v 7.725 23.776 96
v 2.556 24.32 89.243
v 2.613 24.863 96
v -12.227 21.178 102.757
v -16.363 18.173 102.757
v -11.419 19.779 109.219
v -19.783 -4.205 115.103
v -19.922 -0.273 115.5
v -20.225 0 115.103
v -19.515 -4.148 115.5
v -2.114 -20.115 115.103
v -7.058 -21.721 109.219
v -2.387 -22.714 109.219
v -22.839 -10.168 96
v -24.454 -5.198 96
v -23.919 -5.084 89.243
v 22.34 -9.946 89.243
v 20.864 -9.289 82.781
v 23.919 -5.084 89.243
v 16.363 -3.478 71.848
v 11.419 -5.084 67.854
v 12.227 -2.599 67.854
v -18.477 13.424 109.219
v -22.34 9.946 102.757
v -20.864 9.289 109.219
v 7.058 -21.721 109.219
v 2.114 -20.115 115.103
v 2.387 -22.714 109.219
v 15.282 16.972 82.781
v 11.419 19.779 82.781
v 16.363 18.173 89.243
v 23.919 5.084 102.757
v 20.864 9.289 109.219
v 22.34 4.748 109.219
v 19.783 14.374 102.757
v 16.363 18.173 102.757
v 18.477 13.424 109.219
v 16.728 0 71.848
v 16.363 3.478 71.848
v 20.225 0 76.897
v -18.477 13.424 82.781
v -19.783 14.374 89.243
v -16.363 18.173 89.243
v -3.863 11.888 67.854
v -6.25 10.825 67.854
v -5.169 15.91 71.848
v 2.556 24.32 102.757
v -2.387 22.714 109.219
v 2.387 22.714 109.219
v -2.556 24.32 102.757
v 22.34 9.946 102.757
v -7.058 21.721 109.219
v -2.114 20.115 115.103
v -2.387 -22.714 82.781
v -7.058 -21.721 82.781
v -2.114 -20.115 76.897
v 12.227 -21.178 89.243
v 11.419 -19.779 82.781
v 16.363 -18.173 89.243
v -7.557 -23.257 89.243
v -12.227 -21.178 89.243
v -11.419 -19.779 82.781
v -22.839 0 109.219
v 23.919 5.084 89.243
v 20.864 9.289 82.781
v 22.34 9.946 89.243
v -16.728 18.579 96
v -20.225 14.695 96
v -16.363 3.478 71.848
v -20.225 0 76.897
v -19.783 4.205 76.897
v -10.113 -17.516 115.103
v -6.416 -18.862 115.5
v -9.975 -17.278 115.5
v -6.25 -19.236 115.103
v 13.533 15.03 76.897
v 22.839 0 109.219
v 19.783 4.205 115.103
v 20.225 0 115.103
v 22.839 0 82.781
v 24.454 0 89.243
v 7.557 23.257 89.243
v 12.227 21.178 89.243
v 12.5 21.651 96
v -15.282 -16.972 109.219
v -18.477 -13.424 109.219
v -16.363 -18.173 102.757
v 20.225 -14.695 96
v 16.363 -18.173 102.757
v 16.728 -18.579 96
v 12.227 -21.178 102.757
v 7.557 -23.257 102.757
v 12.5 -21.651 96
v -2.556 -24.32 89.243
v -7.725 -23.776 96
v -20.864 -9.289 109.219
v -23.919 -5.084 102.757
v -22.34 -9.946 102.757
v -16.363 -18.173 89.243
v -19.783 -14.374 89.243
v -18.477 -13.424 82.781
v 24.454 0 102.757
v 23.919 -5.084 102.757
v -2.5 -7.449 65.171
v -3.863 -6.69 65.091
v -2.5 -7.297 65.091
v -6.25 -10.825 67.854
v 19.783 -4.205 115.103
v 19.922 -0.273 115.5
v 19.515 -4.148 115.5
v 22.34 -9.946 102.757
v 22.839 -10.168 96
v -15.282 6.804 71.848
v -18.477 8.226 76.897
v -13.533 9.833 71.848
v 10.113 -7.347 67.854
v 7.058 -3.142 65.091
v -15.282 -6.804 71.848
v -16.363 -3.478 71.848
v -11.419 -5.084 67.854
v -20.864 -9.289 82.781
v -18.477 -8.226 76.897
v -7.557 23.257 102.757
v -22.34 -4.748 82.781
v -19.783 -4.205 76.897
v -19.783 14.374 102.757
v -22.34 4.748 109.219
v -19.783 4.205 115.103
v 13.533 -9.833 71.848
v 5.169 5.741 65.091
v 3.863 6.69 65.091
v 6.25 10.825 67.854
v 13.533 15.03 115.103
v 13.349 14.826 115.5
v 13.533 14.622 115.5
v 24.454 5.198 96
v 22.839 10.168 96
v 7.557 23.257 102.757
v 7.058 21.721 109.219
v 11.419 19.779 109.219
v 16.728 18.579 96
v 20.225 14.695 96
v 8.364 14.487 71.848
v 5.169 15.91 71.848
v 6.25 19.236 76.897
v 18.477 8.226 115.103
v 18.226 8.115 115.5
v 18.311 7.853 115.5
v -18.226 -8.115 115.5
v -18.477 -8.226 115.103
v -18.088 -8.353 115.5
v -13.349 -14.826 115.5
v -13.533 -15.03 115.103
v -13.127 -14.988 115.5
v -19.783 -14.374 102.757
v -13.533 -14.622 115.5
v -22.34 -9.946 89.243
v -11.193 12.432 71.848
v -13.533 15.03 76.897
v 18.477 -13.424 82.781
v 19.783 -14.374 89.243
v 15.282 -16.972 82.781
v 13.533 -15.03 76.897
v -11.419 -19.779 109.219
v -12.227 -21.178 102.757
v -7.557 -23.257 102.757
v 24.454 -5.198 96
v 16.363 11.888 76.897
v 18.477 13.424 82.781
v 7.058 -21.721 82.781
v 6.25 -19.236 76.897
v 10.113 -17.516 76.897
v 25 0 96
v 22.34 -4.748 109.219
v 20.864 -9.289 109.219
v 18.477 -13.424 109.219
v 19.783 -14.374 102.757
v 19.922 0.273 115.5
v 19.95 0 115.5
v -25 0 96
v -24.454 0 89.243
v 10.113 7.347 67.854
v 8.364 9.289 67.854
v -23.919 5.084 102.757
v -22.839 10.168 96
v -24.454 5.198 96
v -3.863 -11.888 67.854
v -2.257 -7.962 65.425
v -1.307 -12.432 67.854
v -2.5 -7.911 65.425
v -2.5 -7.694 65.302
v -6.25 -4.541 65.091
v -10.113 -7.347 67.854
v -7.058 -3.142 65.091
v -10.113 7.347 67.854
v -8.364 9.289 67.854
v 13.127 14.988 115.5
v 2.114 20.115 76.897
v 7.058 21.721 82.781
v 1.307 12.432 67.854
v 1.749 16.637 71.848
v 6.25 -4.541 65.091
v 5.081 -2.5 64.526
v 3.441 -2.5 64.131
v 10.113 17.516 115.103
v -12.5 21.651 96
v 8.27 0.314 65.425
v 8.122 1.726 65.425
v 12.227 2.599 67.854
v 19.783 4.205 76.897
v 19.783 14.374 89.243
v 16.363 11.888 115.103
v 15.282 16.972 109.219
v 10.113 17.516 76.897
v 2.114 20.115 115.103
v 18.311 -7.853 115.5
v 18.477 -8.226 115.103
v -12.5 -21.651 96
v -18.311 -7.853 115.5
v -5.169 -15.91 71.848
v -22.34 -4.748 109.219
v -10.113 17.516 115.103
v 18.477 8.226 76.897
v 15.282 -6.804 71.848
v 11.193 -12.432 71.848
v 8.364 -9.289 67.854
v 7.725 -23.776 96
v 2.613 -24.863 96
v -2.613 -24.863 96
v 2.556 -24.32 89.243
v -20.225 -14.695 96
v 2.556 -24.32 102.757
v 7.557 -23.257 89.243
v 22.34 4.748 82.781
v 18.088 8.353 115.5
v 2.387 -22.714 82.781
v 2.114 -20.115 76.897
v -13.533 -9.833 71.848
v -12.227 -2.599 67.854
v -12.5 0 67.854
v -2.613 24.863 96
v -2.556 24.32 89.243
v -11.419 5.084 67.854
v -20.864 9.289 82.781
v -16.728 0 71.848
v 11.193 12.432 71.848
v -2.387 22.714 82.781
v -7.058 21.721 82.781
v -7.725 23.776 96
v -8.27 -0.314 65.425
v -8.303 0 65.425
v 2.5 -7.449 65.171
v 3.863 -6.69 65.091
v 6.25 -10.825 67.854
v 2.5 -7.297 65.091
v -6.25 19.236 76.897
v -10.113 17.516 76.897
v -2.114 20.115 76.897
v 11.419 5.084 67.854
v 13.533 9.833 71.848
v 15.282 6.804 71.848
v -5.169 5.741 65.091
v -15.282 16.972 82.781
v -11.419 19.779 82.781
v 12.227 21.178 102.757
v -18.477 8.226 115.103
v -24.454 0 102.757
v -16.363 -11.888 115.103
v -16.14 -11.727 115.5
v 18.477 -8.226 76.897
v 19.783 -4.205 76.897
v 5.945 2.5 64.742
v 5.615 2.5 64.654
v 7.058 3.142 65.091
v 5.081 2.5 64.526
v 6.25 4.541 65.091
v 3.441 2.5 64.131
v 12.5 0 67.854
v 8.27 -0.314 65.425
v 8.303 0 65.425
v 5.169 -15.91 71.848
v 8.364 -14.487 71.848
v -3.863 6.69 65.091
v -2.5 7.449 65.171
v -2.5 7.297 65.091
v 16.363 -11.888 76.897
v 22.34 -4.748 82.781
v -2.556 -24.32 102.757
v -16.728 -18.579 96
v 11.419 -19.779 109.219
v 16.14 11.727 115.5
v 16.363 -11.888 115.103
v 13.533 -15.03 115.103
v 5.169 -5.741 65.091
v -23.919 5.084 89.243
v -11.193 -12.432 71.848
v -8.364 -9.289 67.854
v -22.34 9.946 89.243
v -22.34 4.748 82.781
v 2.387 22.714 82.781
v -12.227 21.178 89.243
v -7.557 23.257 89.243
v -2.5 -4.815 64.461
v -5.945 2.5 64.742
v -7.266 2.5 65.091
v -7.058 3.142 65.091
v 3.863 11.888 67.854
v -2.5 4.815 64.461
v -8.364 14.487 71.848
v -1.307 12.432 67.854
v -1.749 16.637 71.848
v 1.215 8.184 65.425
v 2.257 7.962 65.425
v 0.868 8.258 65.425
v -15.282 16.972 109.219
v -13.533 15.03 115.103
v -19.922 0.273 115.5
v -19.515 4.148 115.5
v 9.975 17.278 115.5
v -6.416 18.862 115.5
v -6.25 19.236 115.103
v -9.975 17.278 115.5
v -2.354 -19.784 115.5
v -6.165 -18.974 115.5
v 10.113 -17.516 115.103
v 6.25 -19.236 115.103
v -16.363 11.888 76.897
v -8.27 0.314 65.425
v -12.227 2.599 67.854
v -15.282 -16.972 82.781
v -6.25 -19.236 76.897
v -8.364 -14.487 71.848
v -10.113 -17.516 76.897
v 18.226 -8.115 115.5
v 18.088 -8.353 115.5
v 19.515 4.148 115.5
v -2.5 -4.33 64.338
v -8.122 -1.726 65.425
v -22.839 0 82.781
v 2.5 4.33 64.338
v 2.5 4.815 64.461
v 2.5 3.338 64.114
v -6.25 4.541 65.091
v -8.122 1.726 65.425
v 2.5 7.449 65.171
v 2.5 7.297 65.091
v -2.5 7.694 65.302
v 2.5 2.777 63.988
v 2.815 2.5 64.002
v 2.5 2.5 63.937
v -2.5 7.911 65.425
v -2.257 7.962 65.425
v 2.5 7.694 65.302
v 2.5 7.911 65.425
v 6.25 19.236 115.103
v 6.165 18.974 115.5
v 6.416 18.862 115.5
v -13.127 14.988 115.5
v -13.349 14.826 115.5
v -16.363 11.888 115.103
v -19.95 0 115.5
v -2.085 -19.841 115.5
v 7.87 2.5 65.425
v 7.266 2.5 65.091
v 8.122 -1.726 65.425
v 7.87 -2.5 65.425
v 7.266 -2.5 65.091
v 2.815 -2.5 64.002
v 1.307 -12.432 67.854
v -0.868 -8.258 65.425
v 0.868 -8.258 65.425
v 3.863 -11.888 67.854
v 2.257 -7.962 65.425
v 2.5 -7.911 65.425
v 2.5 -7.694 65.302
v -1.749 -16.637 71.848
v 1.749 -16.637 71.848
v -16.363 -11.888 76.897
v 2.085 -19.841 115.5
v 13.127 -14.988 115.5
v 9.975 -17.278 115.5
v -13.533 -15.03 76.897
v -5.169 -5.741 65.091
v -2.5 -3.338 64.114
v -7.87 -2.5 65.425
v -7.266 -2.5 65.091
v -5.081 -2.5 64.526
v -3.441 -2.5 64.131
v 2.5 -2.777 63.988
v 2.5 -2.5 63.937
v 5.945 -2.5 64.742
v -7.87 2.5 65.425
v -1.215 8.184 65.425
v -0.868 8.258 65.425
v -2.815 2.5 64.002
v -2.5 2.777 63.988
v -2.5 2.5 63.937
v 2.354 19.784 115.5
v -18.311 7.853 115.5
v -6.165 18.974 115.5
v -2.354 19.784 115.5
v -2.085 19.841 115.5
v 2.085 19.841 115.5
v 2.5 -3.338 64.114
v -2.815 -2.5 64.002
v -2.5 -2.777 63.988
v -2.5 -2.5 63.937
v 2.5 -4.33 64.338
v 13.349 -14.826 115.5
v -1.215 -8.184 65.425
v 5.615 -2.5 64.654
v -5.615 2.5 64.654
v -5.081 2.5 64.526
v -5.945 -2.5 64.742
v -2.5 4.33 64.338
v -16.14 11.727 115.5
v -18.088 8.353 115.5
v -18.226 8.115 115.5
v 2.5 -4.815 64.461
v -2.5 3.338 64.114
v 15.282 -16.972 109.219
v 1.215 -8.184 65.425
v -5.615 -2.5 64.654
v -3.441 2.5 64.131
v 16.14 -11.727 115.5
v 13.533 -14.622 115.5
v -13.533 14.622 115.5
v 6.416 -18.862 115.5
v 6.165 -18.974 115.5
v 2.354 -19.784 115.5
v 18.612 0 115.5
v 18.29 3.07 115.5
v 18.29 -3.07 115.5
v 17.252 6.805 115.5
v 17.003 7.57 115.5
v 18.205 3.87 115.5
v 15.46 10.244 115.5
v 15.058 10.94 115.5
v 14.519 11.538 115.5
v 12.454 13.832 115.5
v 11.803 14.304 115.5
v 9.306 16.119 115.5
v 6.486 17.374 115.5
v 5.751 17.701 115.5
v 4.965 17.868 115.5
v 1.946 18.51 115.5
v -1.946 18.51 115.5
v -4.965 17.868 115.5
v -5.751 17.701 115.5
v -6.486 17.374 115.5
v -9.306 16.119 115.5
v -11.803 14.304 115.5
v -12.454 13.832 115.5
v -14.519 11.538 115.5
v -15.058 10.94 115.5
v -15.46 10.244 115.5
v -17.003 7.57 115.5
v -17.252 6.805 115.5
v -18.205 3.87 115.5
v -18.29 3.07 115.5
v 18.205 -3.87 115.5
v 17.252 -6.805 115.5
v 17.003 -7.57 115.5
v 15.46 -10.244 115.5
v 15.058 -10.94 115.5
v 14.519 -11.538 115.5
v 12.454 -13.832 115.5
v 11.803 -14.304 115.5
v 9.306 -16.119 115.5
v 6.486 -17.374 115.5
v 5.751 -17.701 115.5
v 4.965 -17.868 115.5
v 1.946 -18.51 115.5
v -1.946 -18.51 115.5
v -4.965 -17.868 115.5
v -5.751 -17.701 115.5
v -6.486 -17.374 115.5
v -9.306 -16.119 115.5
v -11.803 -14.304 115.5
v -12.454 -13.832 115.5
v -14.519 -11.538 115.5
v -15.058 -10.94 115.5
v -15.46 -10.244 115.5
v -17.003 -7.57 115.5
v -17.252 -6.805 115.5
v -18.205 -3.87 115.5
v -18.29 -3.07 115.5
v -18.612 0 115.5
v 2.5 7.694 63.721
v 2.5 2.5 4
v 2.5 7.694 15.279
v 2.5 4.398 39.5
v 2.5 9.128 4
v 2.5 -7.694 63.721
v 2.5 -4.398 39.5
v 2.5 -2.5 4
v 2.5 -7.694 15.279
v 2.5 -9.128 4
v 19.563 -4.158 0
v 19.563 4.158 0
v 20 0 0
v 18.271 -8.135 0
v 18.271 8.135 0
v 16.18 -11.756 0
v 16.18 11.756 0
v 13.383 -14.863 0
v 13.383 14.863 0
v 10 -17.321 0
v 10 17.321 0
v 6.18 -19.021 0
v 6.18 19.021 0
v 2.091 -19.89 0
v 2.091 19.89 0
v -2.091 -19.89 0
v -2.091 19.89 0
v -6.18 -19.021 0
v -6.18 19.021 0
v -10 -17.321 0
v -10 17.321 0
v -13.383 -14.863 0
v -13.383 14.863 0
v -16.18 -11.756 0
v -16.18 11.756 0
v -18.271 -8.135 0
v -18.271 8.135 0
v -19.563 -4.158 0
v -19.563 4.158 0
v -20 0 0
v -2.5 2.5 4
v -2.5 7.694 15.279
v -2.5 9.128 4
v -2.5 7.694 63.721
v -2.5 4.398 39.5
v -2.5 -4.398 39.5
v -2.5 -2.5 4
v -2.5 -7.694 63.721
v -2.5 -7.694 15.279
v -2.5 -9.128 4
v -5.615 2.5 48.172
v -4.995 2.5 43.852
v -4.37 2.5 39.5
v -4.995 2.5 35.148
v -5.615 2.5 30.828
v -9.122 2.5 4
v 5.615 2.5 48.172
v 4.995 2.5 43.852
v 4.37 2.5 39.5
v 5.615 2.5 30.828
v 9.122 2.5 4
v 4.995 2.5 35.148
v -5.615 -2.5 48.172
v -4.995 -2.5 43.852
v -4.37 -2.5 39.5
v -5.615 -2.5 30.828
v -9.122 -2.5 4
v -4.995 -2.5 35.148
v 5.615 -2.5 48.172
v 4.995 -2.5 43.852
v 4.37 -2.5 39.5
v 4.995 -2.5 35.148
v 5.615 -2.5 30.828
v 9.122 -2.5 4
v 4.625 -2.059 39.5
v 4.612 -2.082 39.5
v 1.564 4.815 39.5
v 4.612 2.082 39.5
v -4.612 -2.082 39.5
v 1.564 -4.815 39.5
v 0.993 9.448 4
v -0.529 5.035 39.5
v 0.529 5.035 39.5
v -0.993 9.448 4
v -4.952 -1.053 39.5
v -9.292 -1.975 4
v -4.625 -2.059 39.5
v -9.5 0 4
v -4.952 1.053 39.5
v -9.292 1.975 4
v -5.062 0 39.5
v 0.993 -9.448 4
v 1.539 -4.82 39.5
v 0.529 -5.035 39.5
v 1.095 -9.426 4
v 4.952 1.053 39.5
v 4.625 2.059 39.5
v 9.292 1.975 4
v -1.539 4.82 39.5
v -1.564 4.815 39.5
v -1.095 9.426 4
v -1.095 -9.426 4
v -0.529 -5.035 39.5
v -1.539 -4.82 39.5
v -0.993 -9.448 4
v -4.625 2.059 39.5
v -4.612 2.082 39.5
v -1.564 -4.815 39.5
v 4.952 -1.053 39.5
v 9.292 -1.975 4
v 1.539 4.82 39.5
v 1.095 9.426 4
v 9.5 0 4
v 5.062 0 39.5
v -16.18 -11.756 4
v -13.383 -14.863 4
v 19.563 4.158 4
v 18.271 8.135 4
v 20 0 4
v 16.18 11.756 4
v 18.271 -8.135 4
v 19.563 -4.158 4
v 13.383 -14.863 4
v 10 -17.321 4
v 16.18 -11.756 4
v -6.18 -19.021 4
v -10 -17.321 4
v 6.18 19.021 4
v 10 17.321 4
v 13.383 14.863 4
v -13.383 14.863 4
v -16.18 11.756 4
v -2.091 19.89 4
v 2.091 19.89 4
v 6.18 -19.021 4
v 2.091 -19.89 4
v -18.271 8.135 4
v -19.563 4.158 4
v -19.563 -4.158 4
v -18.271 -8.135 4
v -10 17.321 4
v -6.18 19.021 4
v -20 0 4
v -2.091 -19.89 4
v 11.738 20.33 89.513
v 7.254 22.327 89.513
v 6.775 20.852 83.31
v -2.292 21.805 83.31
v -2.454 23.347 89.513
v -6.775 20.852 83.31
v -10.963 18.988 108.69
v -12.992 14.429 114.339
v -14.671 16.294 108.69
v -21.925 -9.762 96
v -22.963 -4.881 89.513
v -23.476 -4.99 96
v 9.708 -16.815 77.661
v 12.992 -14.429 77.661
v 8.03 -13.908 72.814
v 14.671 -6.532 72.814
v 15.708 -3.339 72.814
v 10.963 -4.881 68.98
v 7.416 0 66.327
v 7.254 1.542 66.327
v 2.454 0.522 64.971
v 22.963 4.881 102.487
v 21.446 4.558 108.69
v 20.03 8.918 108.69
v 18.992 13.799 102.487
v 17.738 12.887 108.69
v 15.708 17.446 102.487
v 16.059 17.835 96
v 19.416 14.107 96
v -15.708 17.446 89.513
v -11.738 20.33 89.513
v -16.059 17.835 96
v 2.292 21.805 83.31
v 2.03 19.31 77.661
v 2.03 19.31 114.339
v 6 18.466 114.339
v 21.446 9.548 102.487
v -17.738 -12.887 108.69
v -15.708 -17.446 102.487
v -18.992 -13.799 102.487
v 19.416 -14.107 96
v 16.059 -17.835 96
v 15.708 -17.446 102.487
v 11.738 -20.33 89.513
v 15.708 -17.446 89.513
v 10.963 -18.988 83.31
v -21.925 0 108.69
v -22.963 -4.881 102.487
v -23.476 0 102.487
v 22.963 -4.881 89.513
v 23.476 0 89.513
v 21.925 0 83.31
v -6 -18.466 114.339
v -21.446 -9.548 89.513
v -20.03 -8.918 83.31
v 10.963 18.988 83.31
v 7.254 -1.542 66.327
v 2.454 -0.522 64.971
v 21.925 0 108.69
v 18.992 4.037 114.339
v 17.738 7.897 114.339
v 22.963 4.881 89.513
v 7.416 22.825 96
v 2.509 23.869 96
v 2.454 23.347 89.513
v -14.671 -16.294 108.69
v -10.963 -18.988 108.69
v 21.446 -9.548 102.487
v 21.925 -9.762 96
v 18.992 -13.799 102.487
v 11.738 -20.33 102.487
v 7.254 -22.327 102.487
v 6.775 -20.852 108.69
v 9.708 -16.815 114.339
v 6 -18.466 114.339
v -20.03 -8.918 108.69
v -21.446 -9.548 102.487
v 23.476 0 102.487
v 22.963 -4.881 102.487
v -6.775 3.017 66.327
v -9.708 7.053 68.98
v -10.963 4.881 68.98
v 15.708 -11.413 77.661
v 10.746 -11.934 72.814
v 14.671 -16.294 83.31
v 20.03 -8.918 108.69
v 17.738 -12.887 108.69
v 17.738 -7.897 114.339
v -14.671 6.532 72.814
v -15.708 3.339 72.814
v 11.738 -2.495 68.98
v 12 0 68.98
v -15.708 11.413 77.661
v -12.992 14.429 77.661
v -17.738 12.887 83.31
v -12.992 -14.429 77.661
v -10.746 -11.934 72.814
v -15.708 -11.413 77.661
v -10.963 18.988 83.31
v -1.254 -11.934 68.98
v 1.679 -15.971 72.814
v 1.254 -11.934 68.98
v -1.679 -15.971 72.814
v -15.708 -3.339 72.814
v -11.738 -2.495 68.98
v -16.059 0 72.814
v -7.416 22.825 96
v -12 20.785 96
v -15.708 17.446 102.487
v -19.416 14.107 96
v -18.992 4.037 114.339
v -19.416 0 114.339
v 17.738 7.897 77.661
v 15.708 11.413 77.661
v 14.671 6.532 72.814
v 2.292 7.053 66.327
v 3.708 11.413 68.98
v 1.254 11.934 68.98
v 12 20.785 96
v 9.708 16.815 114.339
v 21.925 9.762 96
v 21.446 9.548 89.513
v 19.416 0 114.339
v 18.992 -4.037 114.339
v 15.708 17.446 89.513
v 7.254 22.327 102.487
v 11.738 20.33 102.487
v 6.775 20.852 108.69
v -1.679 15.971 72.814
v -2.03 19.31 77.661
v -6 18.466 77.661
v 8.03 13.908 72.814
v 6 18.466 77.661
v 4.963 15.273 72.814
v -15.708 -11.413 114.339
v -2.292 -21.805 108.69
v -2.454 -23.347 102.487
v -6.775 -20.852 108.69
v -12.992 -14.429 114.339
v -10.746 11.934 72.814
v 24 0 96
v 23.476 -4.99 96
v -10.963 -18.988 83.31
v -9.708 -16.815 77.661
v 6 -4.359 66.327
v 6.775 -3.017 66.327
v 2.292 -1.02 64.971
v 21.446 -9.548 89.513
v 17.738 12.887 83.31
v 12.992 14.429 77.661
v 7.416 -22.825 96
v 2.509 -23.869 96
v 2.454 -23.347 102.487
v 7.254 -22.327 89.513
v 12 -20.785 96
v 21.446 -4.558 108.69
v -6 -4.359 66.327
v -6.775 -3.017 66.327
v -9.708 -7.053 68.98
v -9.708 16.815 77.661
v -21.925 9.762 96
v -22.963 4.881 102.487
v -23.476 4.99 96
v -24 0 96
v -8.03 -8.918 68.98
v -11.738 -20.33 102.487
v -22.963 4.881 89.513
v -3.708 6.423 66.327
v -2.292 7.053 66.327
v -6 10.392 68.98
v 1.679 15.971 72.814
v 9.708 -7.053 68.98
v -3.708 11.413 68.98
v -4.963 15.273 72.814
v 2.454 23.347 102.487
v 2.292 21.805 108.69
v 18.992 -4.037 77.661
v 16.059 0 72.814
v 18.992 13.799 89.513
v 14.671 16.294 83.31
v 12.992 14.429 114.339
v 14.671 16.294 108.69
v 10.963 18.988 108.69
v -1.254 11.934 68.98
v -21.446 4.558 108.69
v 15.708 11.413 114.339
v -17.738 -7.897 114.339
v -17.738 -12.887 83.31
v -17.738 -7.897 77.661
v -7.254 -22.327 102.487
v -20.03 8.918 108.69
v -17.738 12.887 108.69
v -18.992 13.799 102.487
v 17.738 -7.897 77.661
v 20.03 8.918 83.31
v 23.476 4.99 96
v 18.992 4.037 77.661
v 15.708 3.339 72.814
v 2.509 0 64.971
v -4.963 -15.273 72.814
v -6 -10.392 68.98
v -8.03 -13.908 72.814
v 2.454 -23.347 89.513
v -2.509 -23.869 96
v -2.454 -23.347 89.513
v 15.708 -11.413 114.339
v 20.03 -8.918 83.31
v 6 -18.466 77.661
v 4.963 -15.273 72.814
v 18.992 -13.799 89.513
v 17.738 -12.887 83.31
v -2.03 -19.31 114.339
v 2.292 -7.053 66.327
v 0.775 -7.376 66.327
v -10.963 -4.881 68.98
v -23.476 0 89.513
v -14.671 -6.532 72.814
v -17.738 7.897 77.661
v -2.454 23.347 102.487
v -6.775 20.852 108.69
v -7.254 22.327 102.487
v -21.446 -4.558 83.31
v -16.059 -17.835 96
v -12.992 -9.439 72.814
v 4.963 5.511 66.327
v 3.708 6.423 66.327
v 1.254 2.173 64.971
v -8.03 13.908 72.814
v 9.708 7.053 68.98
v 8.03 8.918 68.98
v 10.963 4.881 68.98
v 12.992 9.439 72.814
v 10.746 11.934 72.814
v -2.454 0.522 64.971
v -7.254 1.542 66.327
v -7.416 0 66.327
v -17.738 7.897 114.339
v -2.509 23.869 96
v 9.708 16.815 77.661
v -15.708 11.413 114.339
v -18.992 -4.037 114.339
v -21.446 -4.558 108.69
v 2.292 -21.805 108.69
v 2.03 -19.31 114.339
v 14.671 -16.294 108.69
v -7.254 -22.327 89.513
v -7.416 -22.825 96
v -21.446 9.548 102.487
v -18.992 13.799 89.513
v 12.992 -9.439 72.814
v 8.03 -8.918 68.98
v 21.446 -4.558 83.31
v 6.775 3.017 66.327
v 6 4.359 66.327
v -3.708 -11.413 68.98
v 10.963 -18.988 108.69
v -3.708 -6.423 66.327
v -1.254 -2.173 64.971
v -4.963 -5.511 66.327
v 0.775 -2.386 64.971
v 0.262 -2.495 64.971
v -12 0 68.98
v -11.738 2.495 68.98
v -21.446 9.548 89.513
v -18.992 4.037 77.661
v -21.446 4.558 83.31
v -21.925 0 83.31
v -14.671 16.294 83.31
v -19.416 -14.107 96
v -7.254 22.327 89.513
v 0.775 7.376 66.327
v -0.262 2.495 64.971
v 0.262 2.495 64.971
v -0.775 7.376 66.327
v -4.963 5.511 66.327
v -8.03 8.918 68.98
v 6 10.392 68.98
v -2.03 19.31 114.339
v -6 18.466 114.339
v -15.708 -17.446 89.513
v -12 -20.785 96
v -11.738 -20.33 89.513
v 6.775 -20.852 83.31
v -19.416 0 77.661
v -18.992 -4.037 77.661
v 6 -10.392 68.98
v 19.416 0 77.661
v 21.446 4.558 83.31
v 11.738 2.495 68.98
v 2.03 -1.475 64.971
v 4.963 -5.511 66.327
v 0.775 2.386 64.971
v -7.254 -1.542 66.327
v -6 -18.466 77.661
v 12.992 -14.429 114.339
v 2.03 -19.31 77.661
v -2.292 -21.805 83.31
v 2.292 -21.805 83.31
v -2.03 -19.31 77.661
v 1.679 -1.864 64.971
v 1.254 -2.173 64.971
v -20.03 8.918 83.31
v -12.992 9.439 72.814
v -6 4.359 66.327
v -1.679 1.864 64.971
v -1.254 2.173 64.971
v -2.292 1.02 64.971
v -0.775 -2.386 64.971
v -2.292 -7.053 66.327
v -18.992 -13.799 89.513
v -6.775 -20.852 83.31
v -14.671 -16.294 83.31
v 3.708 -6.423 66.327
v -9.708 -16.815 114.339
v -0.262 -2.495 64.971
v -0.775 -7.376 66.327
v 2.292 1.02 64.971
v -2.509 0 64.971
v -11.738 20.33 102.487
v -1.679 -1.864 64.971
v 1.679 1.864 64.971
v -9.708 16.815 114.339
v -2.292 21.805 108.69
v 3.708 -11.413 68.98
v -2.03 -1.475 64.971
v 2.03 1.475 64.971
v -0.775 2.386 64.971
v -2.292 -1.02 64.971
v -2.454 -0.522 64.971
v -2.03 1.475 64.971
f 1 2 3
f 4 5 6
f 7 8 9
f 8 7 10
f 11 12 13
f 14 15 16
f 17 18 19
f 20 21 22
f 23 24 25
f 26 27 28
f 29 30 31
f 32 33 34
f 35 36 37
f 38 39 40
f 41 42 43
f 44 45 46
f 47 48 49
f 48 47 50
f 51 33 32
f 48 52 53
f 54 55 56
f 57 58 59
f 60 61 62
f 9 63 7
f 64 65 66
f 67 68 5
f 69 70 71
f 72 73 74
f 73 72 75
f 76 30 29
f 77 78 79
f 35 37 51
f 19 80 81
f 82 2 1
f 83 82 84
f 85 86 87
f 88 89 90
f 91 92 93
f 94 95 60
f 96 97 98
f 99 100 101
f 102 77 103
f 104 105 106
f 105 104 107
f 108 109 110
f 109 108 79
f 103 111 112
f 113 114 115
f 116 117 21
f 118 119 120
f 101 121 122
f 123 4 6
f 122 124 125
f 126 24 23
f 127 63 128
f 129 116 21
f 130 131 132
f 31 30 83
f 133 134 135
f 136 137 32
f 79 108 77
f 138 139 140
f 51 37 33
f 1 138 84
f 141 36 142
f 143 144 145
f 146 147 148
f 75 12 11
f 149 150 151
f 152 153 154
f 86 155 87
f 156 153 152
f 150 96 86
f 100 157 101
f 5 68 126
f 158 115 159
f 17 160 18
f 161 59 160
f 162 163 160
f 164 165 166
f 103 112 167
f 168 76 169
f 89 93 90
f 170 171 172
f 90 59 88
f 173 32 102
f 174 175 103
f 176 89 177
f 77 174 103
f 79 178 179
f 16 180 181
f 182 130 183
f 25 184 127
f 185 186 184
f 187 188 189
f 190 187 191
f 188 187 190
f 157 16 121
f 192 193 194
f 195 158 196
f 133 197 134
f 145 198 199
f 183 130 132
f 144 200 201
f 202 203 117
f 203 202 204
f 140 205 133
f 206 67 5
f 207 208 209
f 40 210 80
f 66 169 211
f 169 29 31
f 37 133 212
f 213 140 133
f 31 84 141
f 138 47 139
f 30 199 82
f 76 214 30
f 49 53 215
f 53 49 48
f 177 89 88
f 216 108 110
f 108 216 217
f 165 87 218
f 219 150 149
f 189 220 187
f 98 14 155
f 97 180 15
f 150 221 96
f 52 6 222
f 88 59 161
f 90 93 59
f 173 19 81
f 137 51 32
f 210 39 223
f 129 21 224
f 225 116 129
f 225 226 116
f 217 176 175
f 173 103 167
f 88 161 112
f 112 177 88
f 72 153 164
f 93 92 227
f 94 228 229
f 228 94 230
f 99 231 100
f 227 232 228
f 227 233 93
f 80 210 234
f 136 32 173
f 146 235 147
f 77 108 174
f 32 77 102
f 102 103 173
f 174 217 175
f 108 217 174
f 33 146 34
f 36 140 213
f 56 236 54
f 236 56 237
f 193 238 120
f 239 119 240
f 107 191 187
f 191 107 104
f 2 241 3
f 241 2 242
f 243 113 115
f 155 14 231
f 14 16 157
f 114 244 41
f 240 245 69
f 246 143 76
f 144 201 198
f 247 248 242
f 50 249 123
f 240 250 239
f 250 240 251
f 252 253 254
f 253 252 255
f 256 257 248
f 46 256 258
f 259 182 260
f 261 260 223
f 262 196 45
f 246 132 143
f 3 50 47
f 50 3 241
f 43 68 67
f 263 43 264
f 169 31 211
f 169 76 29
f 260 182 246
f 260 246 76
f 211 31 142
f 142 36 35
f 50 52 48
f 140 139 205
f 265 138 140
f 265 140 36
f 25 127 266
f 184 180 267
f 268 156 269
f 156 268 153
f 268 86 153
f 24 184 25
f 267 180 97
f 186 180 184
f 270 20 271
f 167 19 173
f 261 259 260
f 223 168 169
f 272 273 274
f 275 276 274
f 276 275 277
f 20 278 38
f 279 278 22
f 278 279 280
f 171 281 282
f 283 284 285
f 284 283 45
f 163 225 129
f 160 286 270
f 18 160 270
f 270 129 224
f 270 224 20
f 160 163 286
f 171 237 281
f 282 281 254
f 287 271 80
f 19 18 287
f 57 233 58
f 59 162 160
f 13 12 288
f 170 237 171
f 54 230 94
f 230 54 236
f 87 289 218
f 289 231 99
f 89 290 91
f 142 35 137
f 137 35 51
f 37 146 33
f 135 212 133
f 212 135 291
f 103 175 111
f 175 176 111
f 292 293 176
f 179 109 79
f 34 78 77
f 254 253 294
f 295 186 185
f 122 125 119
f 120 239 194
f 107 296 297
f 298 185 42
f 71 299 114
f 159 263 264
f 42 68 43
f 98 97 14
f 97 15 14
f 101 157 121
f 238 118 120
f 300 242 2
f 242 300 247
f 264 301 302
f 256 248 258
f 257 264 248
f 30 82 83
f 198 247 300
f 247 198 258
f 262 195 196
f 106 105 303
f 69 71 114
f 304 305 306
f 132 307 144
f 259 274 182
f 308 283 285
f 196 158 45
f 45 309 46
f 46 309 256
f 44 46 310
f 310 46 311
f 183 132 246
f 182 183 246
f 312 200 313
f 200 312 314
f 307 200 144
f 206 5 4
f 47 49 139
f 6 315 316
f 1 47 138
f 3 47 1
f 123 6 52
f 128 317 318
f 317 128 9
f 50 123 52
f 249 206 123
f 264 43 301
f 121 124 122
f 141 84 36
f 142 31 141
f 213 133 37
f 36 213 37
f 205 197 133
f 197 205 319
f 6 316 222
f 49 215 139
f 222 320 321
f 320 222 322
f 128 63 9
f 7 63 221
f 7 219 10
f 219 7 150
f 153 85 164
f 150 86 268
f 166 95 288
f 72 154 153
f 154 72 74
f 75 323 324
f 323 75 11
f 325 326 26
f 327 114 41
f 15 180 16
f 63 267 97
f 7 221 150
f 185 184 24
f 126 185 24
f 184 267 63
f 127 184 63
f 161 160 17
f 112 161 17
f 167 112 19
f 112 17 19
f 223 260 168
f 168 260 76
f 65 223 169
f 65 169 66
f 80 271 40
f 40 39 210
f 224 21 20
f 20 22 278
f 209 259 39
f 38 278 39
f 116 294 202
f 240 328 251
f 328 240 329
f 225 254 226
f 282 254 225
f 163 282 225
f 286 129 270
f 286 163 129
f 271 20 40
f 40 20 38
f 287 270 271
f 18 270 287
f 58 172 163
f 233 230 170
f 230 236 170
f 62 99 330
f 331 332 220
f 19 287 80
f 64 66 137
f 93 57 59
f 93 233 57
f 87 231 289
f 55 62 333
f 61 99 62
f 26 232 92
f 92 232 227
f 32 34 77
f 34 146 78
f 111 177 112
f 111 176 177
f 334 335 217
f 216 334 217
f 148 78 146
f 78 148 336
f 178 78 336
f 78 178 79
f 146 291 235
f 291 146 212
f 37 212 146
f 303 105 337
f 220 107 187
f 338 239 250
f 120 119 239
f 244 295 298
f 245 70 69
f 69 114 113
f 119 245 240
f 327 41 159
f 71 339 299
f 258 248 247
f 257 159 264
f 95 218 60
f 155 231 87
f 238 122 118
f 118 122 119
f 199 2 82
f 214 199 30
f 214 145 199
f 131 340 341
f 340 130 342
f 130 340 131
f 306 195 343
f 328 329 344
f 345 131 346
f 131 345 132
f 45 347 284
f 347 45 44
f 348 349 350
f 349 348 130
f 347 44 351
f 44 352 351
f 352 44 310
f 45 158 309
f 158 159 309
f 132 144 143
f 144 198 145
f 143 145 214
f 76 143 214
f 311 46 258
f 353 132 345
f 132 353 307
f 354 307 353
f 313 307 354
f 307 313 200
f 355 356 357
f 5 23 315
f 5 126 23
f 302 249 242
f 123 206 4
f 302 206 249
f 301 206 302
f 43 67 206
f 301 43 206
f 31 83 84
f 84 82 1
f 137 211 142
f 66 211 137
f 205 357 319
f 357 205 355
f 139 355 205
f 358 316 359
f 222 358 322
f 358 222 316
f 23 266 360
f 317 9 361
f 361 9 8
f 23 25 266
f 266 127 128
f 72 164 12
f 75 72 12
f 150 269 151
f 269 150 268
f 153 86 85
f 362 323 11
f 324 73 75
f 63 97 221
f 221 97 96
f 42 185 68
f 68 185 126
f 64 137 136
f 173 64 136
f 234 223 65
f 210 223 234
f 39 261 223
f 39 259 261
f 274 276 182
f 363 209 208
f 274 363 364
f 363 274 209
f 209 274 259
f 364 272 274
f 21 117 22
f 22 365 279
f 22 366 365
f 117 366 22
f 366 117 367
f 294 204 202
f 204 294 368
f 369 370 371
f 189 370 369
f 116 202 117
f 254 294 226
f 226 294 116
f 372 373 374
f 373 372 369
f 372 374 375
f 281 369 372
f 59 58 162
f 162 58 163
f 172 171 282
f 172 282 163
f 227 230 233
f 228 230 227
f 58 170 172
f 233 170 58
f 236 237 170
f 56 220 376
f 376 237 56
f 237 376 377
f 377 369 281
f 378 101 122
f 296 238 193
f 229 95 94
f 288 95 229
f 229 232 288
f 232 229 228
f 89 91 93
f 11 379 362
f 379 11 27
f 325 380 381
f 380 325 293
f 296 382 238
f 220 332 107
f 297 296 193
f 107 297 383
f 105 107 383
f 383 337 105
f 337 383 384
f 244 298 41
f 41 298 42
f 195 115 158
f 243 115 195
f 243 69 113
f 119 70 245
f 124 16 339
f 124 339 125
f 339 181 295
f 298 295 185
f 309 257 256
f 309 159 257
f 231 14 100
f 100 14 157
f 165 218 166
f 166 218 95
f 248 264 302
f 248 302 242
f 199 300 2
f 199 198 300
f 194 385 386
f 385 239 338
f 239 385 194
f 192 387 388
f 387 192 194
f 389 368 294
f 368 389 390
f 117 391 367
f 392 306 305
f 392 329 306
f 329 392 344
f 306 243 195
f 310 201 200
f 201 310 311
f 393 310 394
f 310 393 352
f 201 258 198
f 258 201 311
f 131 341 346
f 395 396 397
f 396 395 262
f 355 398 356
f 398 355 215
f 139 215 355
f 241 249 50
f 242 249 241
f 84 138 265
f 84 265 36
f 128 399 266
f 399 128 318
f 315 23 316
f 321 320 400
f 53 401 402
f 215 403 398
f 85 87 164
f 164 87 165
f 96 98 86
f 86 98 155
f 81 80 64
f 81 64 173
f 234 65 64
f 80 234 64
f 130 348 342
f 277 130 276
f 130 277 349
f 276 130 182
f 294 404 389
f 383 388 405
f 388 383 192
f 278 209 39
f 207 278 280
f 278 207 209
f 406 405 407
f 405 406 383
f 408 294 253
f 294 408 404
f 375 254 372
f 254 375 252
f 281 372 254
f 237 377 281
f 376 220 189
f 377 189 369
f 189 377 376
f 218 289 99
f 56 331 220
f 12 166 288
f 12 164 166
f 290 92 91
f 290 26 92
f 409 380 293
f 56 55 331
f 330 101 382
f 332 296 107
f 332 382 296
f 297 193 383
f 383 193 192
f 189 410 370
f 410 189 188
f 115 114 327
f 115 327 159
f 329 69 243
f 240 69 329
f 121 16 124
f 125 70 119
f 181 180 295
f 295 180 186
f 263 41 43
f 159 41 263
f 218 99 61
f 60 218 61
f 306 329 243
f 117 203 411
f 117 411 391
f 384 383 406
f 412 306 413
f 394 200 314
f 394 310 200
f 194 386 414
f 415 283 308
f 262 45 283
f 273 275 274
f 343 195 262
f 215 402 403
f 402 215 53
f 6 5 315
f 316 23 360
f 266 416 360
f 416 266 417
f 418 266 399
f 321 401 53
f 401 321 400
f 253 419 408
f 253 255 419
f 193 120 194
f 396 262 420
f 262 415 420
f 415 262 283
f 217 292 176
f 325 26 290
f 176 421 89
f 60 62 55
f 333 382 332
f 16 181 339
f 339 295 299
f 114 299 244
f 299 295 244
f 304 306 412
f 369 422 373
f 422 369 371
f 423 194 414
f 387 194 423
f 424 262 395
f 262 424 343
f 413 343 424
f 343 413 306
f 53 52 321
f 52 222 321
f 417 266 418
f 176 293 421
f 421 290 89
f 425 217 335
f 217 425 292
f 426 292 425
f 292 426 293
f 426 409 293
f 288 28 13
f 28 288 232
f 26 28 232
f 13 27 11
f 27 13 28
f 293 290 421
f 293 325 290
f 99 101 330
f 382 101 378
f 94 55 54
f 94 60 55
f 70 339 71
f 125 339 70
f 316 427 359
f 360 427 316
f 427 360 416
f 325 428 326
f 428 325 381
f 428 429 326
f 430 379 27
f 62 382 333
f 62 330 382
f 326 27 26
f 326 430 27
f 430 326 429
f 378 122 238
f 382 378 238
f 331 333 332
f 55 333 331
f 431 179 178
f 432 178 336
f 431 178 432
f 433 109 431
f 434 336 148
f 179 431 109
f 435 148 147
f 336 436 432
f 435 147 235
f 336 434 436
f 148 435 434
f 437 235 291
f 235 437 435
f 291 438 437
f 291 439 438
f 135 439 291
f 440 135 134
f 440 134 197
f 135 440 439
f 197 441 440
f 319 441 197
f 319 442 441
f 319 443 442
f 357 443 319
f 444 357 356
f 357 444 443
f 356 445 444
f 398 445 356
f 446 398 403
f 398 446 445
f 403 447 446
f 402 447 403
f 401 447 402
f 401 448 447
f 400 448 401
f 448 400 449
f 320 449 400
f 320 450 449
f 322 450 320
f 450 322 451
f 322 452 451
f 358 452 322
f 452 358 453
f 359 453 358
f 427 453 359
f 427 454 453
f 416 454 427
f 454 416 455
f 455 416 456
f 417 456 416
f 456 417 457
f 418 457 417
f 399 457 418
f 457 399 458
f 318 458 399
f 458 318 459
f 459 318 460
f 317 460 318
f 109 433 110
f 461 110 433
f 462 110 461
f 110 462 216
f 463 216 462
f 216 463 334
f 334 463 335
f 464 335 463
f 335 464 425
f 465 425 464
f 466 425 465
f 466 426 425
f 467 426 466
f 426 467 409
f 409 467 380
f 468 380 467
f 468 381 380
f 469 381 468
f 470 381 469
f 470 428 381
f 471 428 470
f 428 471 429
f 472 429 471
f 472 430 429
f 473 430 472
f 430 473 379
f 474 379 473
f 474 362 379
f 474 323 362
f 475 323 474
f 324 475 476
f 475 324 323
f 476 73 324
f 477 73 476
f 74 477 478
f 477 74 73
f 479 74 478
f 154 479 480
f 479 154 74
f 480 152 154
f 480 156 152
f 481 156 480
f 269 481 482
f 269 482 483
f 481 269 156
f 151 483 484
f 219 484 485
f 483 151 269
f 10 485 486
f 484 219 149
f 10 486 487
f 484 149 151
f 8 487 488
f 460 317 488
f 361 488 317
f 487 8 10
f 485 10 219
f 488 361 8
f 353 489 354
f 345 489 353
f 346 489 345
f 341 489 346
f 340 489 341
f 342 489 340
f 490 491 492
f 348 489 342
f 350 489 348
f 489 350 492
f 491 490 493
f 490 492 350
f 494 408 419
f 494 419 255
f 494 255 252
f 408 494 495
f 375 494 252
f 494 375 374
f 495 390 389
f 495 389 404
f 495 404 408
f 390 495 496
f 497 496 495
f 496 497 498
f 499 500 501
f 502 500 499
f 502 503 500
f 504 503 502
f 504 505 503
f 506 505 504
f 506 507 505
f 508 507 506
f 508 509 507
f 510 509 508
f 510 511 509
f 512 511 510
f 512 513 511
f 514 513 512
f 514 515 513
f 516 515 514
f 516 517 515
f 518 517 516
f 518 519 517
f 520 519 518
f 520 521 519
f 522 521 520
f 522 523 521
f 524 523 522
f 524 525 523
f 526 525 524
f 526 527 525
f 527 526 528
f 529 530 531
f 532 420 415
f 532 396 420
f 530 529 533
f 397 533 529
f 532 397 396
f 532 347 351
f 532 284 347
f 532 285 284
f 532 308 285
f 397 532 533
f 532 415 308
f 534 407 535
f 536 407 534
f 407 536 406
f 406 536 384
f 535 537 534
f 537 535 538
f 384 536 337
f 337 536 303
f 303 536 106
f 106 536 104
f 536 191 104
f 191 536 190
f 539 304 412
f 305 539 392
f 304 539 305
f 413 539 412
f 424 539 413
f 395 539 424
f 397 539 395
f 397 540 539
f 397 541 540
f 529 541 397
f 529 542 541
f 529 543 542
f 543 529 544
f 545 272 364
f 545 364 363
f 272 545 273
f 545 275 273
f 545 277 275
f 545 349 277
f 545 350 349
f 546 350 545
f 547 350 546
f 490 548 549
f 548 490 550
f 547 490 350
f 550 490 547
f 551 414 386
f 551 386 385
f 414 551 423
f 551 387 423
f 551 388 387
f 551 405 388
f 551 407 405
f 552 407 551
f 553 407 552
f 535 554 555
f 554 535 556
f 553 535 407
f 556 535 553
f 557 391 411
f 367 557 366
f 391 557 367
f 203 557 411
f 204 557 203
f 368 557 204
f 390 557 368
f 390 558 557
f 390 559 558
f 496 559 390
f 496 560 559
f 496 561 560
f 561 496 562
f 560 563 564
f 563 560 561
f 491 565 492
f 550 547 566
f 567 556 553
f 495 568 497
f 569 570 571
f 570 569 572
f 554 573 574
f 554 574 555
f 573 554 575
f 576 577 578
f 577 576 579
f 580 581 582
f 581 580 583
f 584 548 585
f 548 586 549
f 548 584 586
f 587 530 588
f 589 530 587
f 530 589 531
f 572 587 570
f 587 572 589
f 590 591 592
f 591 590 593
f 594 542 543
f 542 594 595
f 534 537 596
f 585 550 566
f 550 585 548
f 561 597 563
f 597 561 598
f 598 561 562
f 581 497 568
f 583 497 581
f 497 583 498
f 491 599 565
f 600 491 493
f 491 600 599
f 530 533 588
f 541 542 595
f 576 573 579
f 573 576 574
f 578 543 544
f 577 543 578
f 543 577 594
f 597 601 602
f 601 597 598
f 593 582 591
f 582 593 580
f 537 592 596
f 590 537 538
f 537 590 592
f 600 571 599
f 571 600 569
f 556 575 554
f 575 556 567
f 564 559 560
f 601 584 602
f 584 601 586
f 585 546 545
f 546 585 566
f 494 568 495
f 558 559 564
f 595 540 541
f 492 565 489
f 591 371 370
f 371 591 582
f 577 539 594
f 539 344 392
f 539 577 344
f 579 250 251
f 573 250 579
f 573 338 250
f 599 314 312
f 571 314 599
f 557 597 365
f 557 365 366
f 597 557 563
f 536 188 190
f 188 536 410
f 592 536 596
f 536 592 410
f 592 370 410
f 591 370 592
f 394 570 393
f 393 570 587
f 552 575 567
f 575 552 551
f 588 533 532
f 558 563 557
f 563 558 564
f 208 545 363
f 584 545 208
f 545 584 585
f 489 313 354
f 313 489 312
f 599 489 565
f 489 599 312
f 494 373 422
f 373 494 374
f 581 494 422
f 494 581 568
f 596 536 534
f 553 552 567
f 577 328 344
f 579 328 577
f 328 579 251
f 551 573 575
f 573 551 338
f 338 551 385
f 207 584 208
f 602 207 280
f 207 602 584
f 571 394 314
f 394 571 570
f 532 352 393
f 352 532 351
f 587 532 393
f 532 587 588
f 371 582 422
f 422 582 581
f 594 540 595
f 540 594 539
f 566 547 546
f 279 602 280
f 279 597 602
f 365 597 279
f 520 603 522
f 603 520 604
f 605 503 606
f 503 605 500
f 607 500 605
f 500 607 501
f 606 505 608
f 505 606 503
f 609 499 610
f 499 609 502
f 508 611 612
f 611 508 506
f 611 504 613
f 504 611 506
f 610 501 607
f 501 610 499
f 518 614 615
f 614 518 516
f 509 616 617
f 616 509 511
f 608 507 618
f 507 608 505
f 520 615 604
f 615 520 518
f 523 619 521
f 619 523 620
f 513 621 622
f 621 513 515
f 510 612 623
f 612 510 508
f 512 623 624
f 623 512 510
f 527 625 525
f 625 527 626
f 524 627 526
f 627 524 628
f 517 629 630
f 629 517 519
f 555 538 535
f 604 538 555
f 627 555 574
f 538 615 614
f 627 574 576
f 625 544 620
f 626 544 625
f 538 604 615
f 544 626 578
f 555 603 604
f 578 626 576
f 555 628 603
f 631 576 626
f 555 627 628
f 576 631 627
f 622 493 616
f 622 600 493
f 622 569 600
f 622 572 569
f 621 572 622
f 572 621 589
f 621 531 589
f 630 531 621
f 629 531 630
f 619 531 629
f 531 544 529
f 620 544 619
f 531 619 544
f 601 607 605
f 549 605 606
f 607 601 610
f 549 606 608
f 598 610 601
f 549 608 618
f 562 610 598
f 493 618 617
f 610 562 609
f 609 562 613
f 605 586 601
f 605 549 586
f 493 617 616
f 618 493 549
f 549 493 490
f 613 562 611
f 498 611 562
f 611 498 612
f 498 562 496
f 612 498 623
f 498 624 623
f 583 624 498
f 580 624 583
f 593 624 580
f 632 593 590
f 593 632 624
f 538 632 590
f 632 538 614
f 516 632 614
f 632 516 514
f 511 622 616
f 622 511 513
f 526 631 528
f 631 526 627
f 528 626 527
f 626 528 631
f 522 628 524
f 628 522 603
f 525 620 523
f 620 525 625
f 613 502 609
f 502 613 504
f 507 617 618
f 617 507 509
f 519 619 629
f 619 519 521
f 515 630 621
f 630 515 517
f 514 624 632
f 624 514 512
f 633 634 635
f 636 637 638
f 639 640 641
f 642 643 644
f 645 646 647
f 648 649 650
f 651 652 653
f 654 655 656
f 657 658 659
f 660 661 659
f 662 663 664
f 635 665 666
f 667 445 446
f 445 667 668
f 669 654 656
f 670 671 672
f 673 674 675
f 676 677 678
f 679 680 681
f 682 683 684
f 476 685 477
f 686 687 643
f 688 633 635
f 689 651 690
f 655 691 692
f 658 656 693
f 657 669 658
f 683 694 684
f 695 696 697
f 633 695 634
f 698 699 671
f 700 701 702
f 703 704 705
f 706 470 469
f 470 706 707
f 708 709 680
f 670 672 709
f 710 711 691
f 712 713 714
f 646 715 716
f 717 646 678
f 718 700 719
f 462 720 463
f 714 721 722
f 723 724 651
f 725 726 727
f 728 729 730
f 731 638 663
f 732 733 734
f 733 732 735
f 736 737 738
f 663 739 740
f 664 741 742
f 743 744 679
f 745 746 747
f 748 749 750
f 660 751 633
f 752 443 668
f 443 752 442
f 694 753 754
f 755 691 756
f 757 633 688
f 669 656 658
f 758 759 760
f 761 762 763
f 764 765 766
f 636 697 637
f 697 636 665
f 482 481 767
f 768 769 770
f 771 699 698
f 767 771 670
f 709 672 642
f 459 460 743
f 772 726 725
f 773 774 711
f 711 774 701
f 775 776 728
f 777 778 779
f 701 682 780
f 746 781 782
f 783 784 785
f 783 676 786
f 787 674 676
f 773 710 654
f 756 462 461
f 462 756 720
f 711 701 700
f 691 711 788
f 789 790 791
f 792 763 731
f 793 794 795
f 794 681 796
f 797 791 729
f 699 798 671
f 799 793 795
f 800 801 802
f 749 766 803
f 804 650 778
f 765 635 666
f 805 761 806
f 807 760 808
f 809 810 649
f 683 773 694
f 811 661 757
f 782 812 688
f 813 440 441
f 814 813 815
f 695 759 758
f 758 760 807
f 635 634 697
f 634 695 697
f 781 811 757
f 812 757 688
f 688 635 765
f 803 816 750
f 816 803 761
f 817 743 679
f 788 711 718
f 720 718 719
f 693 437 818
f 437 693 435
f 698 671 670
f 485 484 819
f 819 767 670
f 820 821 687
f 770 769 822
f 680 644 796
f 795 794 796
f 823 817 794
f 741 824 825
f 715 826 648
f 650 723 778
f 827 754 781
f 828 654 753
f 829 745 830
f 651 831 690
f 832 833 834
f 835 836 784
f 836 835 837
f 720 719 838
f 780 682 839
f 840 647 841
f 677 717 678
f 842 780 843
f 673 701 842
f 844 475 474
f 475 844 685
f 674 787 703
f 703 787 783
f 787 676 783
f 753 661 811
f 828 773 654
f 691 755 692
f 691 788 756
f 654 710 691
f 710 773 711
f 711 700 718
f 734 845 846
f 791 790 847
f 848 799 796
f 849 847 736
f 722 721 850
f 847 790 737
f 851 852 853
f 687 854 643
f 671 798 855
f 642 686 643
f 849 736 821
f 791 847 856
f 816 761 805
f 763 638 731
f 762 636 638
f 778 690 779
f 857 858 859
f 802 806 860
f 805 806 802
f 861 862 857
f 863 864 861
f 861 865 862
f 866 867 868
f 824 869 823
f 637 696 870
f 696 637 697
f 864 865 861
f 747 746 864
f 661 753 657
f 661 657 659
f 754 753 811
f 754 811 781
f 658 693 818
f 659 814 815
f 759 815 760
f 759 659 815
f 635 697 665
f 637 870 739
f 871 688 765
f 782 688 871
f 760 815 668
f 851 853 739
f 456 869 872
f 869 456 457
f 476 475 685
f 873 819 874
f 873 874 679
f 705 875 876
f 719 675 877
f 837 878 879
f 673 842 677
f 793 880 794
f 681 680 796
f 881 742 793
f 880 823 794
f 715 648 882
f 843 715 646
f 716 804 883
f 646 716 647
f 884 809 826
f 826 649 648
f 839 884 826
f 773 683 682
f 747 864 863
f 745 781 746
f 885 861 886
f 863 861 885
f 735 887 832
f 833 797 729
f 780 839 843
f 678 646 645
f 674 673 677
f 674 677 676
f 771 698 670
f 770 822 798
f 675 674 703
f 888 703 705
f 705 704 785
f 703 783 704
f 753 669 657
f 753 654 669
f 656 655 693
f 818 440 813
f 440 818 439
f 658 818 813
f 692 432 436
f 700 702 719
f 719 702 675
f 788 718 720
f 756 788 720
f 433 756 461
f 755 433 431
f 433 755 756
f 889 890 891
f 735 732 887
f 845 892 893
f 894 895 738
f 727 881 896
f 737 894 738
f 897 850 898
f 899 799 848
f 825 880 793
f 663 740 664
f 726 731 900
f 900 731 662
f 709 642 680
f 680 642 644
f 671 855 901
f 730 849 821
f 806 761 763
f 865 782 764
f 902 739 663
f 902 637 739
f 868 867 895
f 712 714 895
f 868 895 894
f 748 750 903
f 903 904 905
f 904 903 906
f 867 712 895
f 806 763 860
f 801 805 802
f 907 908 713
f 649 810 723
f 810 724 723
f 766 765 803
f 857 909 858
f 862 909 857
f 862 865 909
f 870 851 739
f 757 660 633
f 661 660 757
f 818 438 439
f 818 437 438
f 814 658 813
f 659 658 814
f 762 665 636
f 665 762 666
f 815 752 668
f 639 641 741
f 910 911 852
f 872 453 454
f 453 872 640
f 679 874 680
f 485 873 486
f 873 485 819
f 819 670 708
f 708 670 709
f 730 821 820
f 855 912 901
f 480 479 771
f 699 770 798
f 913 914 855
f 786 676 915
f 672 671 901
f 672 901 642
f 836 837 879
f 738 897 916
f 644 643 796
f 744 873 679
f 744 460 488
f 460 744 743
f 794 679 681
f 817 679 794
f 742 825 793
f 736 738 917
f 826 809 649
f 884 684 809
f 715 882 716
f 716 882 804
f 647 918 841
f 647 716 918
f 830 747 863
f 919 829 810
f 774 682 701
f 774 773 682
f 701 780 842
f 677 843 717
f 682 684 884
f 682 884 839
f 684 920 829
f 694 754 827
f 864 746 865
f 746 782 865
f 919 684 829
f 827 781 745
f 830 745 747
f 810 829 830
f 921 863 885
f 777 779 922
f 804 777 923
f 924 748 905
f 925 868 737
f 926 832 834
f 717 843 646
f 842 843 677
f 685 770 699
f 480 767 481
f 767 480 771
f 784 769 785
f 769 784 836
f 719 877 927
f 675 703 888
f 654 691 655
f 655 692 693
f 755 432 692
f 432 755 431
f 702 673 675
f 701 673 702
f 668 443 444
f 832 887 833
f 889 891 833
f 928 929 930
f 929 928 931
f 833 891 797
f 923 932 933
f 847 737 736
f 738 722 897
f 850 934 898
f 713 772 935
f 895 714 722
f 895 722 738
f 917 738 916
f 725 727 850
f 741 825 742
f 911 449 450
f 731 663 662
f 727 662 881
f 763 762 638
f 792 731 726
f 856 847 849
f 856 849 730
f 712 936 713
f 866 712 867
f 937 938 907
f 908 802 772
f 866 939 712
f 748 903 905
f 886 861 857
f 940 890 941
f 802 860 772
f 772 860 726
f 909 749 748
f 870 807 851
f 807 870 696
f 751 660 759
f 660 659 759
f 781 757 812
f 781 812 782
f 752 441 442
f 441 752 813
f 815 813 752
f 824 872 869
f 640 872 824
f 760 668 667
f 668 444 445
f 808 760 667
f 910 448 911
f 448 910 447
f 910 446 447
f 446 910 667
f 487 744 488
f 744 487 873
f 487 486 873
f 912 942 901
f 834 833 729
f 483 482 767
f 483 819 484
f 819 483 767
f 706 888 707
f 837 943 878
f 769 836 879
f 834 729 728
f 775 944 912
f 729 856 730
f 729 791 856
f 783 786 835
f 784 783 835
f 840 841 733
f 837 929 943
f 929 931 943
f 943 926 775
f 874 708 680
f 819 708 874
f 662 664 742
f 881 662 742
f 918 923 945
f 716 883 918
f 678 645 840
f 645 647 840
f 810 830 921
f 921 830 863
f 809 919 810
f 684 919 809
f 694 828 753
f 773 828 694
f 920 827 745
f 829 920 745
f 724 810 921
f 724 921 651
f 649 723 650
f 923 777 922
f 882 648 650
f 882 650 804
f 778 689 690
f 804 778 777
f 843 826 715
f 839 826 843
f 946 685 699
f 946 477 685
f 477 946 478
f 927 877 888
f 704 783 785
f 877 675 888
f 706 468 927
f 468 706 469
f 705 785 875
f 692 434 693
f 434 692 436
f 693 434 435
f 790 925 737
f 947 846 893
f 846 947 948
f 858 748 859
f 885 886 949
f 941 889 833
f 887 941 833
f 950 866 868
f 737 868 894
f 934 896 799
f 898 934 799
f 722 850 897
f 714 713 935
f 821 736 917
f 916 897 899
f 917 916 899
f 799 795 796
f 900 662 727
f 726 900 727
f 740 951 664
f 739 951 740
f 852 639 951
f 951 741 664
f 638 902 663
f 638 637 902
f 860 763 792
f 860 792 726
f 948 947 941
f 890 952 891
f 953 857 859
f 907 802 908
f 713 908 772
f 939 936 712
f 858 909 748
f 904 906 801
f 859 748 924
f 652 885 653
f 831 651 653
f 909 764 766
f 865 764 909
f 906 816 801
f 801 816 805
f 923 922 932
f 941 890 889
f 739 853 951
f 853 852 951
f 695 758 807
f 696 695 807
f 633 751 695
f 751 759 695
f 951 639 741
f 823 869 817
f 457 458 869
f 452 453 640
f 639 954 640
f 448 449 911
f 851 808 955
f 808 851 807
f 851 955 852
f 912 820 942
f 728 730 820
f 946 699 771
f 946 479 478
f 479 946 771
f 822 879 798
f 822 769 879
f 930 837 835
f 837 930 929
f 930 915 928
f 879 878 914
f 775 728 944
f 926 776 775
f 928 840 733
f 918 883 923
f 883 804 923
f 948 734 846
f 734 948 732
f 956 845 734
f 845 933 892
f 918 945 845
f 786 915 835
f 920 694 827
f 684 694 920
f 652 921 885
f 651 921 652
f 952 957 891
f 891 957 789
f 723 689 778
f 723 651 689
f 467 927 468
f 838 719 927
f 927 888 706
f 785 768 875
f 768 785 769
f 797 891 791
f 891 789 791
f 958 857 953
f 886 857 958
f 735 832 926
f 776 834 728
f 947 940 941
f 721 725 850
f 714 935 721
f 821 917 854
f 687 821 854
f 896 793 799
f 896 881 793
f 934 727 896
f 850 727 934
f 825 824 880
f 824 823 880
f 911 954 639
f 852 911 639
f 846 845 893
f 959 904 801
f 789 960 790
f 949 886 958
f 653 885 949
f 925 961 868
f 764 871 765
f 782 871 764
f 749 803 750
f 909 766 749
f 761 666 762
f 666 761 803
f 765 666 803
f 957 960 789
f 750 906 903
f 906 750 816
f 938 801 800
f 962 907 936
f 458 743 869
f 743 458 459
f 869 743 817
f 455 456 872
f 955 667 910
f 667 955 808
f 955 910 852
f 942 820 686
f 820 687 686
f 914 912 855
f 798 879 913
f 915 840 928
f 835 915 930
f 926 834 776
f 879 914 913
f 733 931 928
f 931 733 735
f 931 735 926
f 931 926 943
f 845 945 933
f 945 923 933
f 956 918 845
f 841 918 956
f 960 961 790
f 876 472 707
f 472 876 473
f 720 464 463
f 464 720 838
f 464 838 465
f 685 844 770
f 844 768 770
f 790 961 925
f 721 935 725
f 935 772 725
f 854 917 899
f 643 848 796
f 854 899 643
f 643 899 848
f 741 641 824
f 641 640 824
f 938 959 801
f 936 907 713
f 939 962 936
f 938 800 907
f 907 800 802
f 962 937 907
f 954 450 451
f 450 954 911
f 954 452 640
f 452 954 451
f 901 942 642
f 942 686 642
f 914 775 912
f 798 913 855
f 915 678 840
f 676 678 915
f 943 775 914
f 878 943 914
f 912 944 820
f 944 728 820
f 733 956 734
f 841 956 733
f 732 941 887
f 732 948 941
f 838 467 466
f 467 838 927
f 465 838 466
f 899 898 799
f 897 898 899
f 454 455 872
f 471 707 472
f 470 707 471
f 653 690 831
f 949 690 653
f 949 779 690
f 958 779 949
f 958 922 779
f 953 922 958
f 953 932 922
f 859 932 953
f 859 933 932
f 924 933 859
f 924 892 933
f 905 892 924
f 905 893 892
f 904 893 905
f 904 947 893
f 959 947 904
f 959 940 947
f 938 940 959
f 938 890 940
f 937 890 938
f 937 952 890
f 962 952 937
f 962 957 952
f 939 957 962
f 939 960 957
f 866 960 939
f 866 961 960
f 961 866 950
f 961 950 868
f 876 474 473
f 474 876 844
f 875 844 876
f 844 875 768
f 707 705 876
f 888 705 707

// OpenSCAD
module box(x = 10, y = 20, z = 30, center = false)
{
	scale([x,y,z])
	{
		cube(1, center = center);
	}
}

module cone(radius = 10, height = 20, center = false)
{
	cylinder(height, radius, 0, center = center);
}

module tube(outer = 20, inner = 10, height = 100, center = false)
{
	difference()
	{
		cylinder(r = outer, h = height, center = center);
		cylinder(r = inner, h = height, center = center);
	}
}

module pyramid(width = 20, height = 20)
{
	polyhedron(
		points = [
			[width, 0, 0],
			[0, width, 0],
			[-width, 0, 0],
			[0, -width, 0],
			[0, 0, height]
		],
		triangles = [
			[0, 1, 2, 3],
			[4, 1, 0],
			[4, 2, 1],
			[4, 3, 2],
			[4, 0, 3]
		]
	);
}

module wedge(width = 10, height = 20, depth = 30)
{
	rotate([0, -90, 0])
	{
	polyhedron(
		points = [
			[0, 0, 0],
			[height, 0, 0],
			[0, width, 0],
			[0, 0, depth],
			[height, 0, depth],
			[0, width, depth]
		],
		triangles = [
			[0,1,2],
			[5,4,3],
			[3,4,1,0],
			[0,2,5,3],
			[4,5,2,1]
		]
	);
	}
}

module cross(width = 30, thickness = 10, depth = 5)
{
	union()
	{
		box(thickness, width, depth, center = true);
		box(width, thickness, depth, center = true);
	}
}

module wineglass()
{
	module halfstem()
	{
		intersection()
		{
			cylinder(40, 10, 5);
			translate([0,0,20])
			{
				cross(20, 5, 40);
			}
		}
	}

	module stem()
	{
		union()
		{
			halfstem();

			translate([0, 0, 40*2-1])
			{
				rotate([180, 0, 0])
				{
					halfstem();
				}
			}
		}
	}

	module cup()
	{
		scale([1,1,1.3])
		{
			difference()
			{
				sphere(25);
				translate([0, 0, 40])
				{
					cube(50, true);
				}
			}
		}
	}

	module base()
	{
		cylinder(4, 20, 20);
	}

	module main()
	{
		difference()
		{
			union()
			{
				translate([0,0,40*2.4])
				{
					cup();
				}		
				stem();
				base();
			}
			translate([0, 0, 40*2.4])
			{
				scale([1,1,1.3])
				{
					sphere(24);
				}
			}
		}
	}

	main();
}

wineglass();
